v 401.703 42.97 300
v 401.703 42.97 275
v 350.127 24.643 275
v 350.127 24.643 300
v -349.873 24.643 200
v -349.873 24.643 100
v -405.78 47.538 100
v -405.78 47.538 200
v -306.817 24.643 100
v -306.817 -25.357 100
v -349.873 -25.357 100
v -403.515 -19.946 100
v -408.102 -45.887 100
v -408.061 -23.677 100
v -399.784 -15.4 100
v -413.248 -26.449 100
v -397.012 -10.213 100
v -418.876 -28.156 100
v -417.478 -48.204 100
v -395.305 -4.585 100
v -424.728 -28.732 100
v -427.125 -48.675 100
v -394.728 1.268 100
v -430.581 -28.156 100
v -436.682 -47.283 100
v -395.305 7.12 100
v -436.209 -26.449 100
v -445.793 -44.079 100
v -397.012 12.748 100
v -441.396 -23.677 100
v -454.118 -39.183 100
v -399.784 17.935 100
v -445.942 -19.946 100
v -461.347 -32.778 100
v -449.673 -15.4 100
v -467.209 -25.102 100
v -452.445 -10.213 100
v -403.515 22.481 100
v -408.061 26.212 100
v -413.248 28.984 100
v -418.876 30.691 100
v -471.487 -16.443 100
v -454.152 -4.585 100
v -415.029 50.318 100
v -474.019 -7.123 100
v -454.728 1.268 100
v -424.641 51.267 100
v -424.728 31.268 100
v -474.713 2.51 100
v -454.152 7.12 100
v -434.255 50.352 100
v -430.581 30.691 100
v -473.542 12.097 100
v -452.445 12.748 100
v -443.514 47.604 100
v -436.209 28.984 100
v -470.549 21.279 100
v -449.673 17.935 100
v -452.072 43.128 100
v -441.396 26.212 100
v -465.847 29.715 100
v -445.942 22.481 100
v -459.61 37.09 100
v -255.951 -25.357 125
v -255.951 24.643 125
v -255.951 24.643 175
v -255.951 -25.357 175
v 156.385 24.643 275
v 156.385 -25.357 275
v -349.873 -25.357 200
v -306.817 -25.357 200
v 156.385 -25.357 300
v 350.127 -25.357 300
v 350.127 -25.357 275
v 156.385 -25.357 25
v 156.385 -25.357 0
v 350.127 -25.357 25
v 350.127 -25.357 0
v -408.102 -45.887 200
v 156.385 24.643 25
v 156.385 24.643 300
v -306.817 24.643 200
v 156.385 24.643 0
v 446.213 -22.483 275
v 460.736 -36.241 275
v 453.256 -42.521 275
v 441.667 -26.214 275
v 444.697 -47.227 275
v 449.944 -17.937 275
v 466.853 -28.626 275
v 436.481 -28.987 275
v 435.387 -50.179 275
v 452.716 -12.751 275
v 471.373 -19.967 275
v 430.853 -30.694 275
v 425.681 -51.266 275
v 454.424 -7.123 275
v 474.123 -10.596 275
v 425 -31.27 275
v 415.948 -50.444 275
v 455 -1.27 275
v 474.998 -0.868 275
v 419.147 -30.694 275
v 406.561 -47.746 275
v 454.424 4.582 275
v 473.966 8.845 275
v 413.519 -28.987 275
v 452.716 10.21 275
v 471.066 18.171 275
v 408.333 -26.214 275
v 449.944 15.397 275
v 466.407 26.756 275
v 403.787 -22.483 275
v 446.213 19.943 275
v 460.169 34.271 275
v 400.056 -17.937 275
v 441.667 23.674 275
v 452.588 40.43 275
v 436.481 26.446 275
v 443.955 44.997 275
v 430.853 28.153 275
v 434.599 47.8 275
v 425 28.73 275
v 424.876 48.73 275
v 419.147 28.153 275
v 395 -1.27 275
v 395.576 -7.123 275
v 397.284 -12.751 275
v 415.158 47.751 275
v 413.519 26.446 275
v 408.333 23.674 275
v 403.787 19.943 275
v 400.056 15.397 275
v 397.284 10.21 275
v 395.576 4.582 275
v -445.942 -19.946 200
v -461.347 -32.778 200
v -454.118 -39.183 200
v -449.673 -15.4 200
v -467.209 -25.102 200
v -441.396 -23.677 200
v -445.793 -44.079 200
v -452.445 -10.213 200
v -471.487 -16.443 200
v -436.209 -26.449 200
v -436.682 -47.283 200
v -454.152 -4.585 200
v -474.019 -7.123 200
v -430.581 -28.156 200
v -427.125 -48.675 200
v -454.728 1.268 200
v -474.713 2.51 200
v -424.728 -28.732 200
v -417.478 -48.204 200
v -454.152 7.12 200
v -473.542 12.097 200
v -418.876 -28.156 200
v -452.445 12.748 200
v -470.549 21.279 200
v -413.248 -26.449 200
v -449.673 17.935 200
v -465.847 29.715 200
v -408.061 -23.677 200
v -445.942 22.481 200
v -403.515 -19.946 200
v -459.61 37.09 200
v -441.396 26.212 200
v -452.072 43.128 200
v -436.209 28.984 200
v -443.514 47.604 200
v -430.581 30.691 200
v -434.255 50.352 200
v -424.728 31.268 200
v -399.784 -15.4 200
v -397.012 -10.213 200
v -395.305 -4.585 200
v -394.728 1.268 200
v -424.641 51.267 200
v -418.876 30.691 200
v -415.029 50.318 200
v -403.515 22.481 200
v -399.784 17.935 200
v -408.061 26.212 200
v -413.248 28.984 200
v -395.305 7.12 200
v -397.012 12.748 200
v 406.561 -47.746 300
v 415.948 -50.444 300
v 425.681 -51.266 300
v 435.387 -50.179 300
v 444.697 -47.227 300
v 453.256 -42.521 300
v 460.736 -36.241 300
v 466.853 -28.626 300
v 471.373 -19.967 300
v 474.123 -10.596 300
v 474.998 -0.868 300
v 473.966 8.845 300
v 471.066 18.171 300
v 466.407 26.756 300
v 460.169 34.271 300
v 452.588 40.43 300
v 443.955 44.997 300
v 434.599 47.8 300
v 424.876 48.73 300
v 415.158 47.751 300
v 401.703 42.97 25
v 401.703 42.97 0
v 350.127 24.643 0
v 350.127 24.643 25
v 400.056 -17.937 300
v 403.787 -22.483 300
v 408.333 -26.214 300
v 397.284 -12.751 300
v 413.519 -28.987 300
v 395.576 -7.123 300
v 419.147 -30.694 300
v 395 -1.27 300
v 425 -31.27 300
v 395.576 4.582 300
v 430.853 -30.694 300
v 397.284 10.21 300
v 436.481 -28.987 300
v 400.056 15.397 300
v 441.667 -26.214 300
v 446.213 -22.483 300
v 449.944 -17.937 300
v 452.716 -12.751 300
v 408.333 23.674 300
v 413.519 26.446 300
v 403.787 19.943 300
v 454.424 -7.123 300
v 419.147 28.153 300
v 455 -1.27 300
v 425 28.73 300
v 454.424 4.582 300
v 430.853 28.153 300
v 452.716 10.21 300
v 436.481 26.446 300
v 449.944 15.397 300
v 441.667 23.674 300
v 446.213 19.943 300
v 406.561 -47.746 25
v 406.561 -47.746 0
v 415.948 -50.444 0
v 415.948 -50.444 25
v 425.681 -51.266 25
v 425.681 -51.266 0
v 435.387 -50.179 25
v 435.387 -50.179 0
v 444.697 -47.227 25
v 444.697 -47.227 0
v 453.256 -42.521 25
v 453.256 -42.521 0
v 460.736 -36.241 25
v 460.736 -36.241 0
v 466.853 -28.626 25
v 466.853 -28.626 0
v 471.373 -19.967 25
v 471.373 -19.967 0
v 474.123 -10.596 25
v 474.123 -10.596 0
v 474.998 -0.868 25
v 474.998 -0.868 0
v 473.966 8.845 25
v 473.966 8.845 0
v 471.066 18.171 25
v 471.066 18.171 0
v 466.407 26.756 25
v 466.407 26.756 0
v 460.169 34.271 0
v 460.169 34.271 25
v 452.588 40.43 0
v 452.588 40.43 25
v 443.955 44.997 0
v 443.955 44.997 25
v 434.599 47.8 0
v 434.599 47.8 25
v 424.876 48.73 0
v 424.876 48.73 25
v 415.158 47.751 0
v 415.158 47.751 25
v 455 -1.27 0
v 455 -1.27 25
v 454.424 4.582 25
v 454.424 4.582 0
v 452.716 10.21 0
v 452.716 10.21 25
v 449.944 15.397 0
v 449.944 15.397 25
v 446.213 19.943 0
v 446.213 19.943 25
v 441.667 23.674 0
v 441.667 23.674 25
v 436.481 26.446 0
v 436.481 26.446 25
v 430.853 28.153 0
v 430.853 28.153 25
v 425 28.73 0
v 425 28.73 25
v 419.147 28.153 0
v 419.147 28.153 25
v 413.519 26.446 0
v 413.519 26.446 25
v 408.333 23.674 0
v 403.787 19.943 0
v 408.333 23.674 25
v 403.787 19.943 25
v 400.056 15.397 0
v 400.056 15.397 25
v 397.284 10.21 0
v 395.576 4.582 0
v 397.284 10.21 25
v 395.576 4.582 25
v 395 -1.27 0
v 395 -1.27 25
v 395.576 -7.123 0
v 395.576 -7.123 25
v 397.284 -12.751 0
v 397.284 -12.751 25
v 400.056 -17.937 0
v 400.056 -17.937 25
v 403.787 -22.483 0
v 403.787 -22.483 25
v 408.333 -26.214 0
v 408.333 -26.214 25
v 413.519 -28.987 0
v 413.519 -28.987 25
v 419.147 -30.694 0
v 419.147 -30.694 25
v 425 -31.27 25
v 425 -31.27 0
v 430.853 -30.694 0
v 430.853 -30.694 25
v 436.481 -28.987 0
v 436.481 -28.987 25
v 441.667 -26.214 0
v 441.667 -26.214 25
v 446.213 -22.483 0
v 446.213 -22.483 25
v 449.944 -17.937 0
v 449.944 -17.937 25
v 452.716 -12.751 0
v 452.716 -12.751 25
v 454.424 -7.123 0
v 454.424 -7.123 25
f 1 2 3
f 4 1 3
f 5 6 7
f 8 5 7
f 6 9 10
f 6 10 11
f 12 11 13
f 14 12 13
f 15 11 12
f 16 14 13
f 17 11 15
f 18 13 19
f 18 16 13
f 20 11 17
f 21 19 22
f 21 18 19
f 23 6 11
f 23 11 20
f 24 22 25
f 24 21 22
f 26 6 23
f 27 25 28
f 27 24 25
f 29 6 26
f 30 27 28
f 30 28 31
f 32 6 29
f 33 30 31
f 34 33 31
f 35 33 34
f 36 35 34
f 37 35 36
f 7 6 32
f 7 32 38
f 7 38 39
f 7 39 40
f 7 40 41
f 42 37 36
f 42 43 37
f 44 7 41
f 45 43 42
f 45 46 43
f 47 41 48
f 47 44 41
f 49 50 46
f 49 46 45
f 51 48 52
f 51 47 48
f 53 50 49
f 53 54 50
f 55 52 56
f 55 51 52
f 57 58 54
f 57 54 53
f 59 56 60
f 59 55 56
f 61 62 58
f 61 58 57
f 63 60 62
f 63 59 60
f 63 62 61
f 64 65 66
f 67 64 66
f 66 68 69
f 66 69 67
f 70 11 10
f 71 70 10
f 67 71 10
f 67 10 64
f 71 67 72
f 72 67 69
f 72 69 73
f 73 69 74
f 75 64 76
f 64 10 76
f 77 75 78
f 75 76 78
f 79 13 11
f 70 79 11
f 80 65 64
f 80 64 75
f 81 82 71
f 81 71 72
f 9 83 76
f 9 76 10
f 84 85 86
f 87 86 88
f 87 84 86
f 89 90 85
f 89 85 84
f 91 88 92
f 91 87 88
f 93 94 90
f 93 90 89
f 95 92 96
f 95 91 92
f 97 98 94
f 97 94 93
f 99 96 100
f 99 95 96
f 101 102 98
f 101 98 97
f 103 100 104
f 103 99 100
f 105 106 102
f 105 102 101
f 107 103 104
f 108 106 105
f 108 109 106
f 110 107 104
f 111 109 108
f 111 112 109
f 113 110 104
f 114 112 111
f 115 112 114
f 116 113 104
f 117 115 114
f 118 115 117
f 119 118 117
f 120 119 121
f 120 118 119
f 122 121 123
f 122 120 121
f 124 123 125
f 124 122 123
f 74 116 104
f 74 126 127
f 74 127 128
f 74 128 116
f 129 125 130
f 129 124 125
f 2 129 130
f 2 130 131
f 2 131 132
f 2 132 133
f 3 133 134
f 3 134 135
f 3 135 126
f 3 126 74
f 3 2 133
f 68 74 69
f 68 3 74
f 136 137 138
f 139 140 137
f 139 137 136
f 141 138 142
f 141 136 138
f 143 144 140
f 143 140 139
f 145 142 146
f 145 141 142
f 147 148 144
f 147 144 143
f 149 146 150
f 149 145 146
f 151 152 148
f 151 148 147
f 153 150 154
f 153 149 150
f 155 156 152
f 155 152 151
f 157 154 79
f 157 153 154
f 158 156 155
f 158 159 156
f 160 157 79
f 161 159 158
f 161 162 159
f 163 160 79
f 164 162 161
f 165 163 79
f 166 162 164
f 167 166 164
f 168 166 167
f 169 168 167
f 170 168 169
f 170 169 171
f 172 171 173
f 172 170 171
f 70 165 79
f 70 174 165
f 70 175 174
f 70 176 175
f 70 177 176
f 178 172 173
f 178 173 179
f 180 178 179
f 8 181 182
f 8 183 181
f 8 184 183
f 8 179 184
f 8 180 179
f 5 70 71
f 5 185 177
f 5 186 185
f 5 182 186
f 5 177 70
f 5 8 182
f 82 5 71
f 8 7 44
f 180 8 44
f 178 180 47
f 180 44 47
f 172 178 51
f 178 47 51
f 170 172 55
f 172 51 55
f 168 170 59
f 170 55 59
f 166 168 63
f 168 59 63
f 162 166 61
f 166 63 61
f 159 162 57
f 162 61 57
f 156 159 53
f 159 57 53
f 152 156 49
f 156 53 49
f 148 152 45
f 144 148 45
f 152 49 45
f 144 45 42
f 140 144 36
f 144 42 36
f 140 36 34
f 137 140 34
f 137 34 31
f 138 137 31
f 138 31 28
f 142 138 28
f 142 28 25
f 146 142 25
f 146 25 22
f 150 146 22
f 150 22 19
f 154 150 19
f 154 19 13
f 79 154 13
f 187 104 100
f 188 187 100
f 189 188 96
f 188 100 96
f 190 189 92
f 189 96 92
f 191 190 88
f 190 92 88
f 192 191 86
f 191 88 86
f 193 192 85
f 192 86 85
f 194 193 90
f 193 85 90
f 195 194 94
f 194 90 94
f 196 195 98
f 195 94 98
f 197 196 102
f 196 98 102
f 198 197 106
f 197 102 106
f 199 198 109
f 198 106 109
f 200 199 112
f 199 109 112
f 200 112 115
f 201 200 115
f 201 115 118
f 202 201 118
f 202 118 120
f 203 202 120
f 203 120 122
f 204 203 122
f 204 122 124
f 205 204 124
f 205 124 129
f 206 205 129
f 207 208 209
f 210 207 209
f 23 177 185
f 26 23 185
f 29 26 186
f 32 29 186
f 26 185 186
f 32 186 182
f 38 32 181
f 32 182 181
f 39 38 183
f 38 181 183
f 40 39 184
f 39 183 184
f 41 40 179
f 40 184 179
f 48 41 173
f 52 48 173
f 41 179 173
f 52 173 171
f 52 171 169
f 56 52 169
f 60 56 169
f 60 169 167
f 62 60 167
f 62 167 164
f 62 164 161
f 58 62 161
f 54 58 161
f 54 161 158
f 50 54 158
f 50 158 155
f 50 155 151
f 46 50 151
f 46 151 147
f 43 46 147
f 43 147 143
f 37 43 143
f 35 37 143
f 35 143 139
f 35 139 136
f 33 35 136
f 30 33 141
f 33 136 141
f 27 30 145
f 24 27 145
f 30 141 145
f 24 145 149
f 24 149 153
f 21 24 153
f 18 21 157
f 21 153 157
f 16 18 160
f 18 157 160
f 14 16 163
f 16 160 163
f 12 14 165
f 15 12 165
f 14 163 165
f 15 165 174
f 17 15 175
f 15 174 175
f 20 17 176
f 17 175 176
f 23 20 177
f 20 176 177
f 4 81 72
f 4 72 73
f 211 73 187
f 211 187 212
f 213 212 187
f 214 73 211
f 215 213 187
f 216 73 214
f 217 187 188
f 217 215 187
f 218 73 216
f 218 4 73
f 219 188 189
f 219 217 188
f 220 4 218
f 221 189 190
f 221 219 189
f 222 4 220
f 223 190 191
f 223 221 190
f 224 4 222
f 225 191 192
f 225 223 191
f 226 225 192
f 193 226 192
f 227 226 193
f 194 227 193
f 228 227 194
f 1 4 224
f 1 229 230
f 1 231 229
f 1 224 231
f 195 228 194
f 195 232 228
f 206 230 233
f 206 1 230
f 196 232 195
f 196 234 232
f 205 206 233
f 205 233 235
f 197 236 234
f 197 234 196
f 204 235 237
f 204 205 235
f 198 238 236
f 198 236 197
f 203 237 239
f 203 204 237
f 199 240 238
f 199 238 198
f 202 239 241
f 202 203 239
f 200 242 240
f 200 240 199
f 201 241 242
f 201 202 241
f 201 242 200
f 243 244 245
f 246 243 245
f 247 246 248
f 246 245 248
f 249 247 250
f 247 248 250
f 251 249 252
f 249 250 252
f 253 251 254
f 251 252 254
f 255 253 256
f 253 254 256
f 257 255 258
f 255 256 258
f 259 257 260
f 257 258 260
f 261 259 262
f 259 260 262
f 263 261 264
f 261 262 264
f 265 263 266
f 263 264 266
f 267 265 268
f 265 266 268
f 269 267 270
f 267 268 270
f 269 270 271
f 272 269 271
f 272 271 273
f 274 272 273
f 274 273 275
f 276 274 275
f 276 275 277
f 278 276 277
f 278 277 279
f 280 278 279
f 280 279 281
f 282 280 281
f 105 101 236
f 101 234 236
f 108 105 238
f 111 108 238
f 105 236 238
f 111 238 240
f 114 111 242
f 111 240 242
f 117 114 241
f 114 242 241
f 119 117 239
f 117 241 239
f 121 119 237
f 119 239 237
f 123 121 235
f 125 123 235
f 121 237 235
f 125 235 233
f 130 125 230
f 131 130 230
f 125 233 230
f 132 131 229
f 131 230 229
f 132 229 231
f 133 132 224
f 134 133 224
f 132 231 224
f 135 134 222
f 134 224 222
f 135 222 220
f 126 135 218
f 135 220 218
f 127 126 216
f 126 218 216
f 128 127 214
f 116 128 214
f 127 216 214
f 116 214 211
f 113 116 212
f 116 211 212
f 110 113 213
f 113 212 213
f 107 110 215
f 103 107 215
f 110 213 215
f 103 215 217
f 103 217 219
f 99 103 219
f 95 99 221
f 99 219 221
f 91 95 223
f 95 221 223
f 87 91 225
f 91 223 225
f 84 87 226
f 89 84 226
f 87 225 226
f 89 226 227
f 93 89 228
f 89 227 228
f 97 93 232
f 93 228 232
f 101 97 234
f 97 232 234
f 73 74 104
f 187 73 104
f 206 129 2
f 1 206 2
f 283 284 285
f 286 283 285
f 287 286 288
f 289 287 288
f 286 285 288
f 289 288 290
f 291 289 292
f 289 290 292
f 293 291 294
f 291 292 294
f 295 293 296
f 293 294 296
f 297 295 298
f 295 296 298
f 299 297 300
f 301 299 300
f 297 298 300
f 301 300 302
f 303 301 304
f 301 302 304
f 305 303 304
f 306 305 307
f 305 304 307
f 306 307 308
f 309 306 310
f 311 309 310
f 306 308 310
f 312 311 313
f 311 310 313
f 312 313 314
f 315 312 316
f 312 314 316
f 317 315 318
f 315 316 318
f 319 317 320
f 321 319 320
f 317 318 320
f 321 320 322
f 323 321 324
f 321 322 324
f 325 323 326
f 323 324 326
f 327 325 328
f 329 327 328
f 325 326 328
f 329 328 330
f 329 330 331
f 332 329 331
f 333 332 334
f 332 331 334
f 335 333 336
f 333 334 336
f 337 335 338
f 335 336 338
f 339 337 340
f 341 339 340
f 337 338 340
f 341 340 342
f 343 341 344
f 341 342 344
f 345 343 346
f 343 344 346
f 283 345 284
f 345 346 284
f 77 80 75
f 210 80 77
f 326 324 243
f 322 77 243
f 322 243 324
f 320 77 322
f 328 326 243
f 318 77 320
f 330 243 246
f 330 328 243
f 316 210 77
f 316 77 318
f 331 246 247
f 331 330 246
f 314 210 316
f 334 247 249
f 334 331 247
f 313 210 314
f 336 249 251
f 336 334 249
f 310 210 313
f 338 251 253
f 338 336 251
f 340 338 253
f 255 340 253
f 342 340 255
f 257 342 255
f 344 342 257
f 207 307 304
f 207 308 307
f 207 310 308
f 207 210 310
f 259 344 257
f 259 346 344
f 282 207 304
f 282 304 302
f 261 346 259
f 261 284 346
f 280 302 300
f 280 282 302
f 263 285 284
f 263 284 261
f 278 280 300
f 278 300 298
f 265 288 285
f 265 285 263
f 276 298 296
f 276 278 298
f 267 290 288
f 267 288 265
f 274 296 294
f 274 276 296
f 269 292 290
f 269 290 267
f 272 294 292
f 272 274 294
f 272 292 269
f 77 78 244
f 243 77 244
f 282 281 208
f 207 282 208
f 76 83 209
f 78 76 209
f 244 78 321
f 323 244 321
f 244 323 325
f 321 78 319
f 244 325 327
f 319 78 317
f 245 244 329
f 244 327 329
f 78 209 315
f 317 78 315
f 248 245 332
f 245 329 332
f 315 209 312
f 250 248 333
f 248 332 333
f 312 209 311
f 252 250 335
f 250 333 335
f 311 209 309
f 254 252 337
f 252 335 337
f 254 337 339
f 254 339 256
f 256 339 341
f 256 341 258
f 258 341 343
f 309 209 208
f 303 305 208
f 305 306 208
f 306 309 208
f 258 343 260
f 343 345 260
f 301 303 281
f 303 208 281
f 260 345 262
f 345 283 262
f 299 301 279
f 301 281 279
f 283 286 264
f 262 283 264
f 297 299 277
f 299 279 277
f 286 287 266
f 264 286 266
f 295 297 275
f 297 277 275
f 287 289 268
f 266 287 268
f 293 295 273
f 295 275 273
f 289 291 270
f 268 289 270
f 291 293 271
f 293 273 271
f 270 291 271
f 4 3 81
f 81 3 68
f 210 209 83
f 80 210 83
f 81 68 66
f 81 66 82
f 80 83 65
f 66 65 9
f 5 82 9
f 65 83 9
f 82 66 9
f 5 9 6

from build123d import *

# Parameters (mm, degrees)
BOSS_EXTRUDE1_DEPTH = 300
SKETCH3_OUTSIDE_W   = 1151.978
SKETCH3_OUTSIDE_H   = 502.25
CUT_EXTRUDE1_DEPTH  = 300
CUT_EXTRUDE3_DEPTH  = 300
SKETCH6_R           = 30
CUT_EXTRUDE4_DEPTH  = 200


with BuildPart() as part:
    # Sketch1 → Boss-Extrude1 (new body)
    with BuildSketch(Plane.XY):
        with BuildLine():
            Line((350.126678984, 24.643496119), (-349.873321016, 24.643496119))
            Line((-349.873321016, 24.643496119), (-405.7801007, 47.538028277))
            ThreePointArc((-405.7801007, 47.538028277), (-474.713018176, 2.509970806), (-408.102340797, -45.887247404))
            Line((-408.102340797, -45.887247404), (-349.873321016, -25.356503881))
            Line((-349.873321016, -25.356503881), (350.126678984, -25.356503881))
            Line((350.126678984, -25.356503881), (406.56125394, -47.746215249))
            ThreePointArc((406.56125394, -47.746215249), (474.7986376, -5.753101083), (415.157857426, 47.751473547))
            Line((415.157857426, 47.751473547), (401.702587644, 42.970319678))
            Line((401.702587644, 42.970319678), (350.126678984, 24.643496119))
        make_face()
    extrude(amount=BOSS_EXTRUDE1_DEPTH)

    # Sketch3 outside → Cut-Extrude1 (cut)
    with BuildSketch(Plane(origin=(0, 24.643496119, 0), x_dir=(1, 0, 0), z_dir=(0, 1, 0))):
        with Locations((0.136, -150)):
            Rectangle(SKETCH3_OUTSIDE_W, SKETCH3_OUTSIDE_H)
        Polygon((156.384680345, -275), (-255.951397242, -175), (-255.951397242, -150), (-255.951397242, -125), (156.384680345, -25), (646.790959518, -25), (660.003845731, 0), (156.384680345, 0), (-306.817002614, -100), (-623.605485165, -100), (-623.605485165, -200), (-306.817002614, -200), (156.384680345, -300), (568.093933709, -300), (523.266387174, -275), align=None, mode=Mode.SUBTRACT)
    extrude(amount=-CUT_EXTRUDE1_DEPTH, mode=Mode.SUBTRACT)

    # Sketch5 → Cut-Extrude3 (cut)
    with BuildSketch(Plane(origin=(0, 24.643496119, 0), x_dir=(1, 0, 0), z_dir=(0, 1, 0))):
        Polygon((156.384680345, -25), (555.921134312, -25), (555.921134312, -275), (156.384680345, -275), (-255.951397242, -175), (-255.951397242, -125), align=None)
        Polygon((-349.873321016, -100), (-477.733615617, -100), (-477.733615617, 50.340527991), (-332.07706739, 50.340527991), align=None)
        Polygon((-349.873321016, -200), (-349.873321016, -364.123748435), (-511.890412396, -324.647411731), (-481.519399358, -200), align=None)
    extrude(amount=CUT_EXTRUDE3_DEPTH, mode=Mode.SUBTRACT)

    # Sketch6 → Cut-Extrude4 (cut, symmetric)
    with BuildSketch(Plane.XY.offset(200)):
        with Locations((-424.728457358, 1.267521688)):
            Circle(SKETCH6_R)
        with Locations((425, -1.27027907)):
            Circle(SKETCH6_R)
    extrude(amount=CUT_EXTRUDE4_DEPTH, both=True, mode=Mode.SUBTRACT)


solid = part.part
